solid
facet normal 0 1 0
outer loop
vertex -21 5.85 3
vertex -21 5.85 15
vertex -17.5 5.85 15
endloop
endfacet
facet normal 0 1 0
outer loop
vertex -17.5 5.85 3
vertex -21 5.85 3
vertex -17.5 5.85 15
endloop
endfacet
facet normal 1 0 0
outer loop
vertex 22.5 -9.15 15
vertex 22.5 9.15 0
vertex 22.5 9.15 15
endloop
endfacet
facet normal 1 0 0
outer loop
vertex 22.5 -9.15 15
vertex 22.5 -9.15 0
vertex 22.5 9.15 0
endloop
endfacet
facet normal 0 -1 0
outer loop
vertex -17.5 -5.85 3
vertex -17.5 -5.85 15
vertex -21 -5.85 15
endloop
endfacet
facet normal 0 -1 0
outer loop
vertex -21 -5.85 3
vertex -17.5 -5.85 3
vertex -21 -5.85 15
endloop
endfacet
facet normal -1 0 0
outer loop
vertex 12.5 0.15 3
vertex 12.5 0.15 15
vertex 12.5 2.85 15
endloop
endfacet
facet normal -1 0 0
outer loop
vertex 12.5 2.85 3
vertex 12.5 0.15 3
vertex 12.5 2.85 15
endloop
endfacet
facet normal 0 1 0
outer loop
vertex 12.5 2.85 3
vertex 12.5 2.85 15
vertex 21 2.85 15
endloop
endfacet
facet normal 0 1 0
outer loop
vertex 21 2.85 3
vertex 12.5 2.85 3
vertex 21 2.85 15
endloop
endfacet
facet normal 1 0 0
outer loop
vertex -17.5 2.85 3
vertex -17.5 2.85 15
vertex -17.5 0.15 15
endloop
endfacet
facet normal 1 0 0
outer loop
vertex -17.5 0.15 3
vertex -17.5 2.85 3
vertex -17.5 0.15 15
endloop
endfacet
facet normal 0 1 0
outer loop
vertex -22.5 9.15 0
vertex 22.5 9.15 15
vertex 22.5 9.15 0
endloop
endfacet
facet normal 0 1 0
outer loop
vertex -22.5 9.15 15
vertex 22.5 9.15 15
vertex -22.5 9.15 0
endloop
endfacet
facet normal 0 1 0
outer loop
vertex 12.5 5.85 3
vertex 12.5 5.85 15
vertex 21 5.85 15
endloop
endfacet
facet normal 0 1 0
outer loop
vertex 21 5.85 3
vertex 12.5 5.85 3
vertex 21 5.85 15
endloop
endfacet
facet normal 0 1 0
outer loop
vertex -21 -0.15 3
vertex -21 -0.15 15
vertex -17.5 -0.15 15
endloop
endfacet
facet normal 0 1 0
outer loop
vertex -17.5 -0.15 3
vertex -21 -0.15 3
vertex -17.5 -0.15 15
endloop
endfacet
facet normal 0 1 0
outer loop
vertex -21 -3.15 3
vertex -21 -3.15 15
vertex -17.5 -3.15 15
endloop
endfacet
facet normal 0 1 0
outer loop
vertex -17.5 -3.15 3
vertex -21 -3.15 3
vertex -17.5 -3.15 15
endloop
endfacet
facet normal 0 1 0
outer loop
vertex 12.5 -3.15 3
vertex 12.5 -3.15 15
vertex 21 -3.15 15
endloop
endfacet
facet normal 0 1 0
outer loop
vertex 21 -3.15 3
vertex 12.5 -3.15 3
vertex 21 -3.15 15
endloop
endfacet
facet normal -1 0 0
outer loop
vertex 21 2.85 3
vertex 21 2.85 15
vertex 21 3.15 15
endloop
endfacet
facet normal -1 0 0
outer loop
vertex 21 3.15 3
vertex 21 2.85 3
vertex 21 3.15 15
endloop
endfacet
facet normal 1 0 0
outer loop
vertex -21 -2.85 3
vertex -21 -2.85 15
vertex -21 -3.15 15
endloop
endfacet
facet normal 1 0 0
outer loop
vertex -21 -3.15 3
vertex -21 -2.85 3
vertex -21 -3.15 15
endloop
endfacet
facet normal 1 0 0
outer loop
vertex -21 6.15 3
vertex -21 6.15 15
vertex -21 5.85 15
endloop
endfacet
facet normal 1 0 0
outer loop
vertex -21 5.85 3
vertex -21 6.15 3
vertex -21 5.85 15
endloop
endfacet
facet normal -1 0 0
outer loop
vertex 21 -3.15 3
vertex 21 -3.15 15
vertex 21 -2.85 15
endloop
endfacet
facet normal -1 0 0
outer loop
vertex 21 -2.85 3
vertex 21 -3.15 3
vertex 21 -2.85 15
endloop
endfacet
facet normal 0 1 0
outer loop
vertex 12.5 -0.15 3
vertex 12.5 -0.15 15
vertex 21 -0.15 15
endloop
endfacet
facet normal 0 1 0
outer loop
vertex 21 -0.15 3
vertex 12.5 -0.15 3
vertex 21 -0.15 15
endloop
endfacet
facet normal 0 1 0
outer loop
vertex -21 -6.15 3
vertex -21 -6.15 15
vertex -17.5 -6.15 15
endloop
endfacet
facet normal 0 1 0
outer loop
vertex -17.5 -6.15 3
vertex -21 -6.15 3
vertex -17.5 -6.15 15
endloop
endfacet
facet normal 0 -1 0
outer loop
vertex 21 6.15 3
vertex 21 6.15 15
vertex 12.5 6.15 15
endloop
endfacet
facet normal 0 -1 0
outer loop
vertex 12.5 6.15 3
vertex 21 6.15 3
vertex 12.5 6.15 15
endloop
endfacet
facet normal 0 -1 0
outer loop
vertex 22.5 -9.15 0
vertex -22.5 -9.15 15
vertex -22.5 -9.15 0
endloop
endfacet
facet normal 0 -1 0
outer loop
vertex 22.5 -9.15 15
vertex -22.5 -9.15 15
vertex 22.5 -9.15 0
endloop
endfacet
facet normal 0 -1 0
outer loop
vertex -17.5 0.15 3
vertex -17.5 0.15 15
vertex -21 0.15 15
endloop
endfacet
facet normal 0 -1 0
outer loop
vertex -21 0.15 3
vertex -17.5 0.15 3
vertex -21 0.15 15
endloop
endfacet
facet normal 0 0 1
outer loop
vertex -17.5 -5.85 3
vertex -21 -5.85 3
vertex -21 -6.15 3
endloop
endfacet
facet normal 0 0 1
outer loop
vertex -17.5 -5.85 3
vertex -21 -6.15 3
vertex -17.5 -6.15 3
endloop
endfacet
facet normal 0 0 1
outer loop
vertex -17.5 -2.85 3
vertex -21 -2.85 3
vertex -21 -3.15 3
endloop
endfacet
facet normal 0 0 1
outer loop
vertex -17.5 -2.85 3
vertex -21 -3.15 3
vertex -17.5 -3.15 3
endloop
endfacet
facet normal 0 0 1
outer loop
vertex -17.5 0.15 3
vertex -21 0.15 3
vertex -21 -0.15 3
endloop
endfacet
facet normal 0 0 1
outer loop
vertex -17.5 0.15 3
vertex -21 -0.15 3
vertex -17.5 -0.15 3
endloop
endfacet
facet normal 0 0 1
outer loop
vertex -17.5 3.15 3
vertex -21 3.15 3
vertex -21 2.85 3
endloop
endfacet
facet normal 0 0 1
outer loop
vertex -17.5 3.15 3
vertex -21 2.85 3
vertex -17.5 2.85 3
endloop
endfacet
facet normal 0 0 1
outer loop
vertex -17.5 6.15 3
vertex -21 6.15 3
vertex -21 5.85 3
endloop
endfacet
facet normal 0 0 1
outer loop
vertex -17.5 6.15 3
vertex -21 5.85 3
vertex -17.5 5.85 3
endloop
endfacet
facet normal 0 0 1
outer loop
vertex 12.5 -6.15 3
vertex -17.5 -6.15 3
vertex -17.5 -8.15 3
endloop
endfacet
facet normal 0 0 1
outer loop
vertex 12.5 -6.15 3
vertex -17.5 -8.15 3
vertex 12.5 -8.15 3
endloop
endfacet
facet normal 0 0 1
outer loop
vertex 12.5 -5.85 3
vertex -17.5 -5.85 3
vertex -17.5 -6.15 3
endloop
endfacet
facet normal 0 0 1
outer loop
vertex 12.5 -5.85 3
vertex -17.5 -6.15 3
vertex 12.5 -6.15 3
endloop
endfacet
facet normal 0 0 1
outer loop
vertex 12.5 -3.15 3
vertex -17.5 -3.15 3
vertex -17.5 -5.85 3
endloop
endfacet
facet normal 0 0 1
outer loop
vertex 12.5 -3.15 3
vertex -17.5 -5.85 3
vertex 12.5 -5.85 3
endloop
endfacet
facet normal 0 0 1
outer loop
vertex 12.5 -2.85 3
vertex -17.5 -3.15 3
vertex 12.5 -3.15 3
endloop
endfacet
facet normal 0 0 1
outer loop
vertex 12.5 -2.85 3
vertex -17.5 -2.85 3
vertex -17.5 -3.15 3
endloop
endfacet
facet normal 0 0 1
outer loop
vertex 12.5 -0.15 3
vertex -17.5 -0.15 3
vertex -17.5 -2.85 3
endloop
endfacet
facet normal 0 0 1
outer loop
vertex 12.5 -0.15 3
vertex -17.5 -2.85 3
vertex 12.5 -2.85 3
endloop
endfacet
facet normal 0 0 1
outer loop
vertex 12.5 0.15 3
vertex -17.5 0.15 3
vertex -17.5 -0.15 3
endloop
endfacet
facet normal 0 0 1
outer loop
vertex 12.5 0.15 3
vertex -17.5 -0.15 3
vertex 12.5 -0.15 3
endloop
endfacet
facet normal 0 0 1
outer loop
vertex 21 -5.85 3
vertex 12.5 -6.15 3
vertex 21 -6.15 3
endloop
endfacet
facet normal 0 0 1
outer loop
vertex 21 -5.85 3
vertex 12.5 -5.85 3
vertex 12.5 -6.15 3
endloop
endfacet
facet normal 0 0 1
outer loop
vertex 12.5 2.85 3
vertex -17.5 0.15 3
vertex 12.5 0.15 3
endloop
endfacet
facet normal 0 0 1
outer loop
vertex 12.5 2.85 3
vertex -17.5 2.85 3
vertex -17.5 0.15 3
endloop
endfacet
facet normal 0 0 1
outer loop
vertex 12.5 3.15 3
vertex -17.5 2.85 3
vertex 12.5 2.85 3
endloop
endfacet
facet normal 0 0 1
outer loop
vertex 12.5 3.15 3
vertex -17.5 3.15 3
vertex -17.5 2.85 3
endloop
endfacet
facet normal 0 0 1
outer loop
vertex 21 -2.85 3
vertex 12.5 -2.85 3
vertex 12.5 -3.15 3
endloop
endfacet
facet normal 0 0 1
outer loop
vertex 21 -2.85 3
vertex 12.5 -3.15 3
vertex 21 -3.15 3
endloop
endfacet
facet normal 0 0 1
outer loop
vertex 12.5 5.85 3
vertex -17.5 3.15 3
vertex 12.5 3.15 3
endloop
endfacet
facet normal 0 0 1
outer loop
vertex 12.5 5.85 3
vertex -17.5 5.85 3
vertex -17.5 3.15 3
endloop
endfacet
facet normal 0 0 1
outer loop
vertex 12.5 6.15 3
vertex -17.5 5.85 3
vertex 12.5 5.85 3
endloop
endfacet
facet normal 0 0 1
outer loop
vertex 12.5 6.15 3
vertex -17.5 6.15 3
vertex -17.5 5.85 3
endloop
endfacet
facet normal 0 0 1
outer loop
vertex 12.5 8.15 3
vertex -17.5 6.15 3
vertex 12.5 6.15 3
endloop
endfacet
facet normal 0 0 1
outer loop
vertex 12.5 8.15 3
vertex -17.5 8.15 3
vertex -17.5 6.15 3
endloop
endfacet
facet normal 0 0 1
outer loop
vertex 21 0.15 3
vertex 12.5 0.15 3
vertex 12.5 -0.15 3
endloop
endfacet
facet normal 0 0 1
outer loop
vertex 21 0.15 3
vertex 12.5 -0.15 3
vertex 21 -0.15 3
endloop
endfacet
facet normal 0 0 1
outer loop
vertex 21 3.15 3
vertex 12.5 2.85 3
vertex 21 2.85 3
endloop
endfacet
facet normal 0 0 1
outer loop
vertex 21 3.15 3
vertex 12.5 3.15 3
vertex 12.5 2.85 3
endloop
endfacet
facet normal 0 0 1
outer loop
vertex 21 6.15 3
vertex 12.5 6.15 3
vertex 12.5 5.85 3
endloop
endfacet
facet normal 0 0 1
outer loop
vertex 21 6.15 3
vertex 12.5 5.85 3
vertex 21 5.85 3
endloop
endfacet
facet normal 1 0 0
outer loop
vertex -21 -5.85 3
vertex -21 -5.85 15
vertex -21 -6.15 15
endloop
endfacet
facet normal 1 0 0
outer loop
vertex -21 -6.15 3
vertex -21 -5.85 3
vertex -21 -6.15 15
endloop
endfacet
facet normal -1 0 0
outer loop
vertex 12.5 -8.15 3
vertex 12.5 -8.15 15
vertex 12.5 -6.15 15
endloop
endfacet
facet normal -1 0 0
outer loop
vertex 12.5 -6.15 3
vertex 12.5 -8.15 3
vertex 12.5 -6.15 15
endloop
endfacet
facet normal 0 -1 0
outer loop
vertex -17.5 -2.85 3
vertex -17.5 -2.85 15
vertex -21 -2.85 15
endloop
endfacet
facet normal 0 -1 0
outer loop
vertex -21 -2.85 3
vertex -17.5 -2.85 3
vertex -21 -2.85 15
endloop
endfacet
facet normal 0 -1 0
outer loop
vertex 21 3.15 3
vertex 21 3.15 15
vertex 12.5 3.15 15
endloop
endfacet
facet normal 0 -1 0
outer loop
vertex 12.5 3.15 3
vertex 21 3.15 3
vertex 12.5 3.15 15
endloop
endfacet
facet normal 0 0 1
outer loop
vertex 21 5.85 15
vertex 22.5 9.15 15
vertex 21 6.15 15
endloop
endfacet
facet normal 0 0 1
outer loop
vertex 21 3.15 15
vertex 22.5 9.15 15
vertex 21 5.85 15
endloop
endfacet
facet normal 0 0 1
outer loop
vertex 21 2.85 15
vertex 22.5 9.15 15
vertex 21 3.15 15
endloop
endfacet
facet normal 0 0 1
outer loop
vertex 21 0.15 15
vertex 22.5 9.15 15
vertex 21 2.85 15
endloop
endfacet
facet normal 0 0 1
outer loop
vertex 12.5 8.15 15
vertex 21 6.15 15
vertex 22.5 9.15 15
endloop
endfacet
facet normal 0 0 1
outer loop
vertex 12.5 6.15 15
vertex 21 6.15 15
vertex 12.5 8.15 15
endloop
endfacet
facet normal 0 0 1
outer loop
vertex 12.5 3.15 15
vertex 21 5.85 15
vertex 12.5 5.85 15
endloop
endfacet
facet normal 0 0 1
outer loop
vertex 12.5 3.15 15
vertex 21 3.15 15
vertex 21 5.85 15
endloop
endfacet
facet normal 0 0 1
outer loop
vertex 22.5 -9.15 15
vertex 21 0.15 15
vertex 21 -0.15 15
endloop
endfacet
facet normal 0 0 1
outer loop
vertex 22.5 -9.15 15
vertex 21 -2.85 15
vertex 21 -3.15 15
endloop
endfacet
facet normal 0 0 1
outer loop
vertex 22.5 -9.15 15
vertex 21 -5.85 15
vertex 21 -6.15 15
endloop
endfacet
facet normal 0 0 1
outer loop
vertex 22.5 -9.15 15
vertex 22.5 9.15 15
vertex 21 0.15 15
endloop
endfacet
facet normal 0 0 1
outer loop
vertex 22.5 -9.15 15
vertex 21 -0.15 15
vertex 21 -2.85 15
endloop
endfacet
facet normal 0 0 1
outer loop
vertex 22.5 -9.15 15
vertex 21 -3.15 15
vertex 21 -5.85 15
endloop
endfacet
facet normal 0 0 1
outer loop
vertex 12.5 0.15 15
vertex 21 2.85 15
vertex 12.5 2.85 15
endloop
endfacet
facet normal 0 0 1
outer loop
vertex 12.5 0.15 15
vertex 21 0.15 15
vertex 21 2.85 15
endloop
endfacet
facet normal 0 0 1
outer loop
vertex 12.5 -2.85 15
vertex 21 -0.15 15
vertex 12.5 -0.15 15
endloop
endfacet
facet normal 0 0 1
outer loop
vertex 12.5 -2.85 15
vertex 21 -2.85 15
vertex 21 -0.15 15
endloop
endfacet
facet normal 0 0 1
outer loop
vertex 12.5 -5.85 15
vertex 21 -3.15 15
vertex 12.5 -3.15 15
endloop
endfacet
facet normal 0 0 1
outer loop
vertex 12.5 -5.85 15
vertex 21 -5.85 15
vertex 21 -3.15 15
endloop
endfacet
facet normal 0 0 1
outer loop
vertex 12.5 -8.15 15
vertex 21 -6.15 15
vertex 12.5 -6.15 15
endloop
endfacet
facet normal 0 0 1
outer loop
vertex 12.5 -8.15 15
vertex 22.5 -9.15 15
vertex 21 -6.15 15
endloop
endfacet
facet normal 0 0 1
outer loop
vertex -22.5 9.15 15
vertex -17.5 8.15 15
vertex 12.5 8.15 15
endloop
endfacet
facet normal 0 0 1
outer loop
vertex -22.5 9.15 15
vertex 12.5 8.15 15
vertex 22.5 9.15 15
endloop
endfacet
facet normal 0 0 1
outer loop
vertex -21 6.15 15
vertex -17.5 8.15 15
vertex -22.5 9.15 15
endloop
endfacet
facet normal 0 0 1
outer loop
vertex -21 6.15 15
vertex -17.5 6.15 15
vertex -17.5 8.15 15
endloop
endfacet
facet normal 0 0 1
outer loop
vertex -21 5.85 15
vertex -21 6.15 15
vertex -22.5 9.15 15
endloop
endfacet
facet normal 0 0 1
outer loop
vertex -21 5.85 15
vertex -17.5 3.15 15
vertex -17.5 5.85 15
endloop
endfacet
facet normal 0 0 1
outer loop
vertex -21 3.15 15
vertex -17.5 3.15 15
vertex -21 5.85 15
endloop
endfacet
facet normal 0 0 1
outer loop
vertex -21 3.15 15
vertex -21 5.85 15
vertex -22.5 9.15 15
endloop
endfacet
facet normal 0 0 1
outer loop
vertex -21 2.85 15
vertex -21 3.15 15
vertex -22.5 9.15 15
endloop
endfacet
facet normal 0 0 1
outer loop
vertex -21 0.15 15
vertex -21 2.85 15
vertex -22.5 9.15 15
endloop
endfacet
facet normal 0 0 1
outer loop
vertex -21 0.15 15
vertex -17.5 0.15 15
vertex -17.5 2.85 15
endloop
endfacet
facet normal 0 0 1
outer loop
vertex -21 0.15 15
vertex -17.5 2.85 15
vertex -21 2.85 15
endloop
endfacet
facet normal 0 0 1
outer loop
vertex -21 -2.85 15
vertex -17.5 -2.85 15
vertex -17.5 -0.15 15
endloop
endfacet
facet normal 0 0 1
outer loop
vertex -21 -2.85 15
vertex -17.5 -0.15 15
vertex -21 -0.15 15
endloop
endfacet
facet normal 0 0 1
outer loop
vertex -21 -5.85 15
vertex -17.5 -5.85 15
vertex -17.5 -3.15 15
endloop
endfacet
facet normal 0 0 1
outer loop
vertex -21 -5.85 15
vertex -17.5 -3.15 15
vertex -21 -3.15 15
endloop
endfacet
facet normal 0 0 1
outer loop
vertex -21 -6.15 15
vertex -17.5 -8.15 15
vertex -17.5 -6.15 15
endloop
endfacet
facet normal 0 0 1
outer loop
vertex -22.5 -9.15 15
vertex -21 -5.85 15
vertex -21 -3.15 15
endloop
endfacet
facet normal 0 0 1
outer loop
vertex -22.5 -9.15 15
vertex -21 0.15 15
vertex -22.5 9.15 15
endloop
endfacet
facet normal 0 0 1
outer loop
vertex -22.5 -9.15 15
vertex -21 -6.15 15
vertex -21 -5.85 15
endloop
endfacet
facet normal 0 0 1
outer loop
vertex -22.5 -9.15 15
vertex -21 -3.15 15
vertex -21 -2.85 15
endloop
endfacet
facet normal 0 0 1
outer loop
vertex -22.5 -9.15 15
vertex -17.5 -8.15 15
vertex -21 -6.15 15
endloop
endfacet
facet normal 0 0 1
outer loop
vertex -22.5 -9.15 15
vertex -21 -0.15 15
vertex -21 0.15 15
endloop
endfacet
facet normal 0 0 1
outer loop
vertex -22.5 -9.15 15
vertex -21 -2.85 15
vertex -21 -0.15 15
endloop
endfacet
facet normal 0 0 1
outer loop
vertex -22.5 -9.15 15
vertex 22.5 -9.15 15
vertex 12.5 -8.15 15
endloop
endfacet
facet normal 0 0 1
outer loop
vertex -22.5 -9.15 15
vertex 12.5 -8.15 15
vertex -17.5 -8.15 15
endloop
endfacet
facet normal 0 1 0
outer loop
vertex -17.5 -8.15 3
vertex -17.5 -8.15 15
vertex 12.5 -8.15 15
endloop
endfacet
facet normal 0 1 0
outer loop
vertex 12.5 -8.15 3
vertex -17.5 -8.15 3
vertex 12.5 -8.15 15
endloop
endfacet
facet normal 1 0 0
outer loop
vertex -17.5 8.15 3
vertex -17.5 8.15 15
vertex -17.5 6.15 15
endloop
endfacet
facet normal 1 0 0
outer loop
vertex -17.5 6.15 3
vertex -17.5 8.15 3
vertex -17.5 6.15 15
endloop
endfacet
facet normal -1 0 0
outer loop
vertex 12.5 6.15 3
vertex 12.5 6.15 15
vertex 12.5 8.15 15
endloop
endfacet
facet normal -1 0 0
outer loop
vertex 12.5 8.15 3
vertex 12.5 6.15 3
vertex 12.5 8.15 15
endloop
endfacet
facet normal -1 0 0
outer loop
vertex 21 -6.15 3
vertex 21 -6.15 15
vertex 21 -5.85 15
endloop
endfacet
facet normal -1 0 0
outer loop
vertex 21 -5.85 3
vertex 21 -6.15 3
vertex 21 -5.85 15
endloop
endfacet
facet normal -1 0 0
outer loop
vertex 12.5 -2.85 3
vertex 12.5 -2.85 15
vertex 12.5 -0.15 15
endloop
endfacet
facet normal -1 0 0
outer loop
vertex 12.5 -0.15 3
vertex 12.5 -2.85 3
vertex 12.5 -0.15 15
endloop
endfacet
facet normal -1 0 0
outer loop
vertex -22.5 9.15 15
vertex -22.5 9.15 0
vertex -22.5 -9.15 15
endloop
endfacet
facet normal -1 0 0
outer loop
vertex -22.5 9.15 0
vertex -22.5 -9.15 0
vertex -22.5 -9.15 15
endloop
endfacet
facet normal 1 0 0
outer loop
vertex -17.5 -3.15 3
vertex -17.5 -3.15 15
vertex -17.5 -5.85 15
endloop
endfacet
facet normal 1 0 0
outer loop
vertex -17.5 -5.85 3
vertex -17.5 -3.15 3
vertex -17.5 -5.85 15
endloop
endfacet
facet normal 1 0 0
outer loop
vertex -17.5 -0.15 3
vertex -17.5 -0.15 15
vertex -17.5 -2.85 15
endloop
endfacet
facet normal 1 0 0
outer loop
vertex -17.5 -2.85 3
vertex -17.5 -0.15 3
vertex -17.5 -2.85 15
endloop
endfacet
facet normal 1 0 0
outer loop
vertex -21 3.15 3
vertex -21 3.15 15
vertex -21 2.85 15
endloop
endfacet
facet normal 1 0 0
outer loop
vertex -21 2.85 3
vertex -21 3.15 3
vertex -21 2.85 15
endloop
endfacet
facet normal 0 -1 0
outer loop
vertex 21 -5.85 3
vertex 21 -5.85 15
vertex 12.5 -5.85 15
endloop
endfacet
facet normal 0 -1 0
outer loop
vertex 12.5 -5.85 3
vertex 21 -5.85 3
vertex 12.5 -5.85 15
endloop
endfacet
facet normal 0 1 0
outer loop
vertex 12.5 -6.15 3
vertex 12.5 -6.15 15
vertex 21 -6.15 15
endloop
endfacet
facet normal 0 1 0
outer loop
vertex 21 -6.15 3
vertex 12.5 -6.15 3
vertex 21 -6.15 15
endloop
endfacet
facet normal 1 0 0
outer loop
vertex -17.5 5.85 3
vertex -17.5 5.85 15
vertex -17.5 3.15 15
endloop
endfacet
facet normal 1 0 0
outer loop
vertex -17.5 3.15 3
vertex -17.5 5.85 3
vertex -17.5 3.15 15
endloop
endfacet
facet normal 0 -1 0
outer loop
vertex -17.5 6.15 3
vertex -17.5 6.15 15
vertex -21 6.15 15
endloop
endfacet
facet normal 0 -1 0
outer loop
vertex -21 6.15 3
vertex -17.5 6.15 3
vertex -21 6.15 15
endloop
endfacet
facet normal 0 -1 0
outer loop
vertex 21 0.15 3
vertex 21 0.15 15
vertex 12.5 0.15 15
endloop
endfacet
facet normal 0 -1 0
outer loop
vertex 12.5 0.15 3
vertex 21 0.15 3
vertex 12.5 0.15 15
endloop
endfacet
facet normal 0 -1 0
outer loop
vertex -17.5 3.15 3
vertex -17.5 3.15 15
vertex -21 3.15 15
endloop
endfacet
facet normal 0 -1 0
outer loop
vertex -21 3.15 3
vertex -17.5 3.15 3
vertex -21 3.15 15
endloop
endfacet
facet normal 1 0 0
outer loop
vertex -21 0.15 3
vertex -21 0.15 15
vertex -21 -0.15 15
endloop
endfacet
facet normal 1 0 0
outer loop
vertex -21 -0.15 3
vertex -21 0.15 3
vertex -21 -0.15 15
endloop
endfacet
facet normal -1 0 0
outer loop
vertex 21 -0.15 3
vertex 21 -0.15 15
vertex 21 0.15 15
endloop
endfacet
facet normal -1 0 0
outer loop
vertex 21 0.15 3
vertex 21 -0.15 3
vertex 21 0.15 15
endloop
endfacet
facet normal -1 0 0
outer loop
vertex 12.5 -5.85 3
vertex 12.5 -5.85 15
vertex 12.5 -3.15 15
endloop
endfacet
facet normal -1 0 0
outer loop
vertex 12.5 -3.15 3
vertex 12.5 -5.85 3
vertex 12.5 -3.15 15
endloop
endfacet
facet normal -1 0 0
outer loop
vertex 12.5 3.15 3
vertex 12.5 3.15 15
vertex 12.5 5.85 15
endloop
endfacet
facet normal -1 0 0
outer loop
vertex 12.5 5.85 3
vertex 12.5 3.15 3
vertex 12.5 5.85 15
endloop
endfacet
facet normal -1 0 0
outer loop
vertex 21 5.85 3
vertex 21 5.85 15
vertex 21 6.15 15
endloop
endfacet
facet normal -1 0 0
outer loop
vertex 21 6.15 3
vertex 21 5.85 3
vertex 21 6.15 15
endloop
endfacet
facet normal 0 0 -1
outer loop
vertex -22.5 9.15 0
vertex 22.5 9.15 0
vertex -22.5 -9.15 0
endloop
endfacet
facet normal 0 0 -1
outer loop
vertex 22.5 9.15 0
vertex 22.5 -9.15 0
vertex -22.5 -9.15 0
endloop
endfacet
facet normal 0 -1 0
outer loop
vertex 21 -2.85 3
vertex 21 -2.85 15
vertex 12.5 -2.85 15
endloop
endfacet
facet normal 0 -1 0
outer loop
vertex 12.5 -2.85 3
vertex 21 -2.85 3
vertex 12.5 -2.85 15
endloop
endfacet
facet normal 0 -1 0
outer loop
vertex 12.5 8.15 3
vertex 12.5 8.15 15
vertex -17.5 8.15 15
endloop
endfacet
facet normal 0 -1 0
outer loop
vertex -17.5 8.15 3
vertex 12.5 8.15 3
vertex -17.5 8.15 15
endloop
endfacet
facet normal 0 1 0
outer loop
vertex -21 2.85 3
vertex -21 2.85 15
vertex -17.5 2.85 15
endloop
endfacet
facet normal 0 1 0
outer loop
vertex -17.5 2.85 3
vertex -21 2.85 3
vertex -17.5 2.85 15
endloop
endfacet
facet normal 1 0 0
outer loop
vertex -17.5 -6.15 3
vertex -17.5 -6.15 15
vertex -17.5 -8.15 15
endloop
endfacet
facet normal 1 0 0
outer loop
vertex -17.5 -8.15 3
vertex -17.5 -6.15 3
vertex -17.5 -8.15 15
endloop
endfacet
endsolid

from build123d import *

# Parameters (mm, degrees)
F0_W     = 45
F0_H     = 16.3
F1_DEPTH = 15
F3_DEPTH = 12
F4_W     = 45
F4_H     = 15
F5_DEPTH = 1
F6_W     = 45
F6_H     = 15
F7_DEPTH = 1


with BuildPart() as f1:
    # F0 (on Top) → F1 (new body)
    with BuildSketch(Plane.XY):
        Rectangle(F0_W, F0_H)
    extrude(amount=F1_DEPTH)

    # F2 (on face) → F3 (cut)
    with BuildSketch(Plane.XY.offset(15)):
        Polygon((-21, -5.85), (-21, -6.15), (-17.5, -6.15), (-17.5, -8.15), (12.5, -8.15), (12.5, -6.15), (21, -6.15), (21, -5.85), (12.5, -5.85), (12.5, -3.15), (21, -3.15), (21, -2.85), (12.5, -2.85), (12.5, -0.15), (21, -0.15), (21, 0.15), (12.5, 0.15), (12.5, 2.85), (21, 2.85), (21, 3.15), (12.5, 3.15), (12.5, 5.85), (21, 5.85), (21, 6.15), (12.5, 6.15), (12.5, 8.15), (-17.5, 8.15), (-17.5, 6.15), (-21, 6.15), (-21, 5.85), (-17.5, 5.85), (-17.5, 3.15), (-21, 3.15), (-21, 2.85), (-17.5, 2.85), (-17.5, 0.15), (-21, 0.15), (-21, -0.15), (-17.5, -0.15), (-17.5, -2.85), (-21, -2.85), (-21, -3.15), (-17.5, -3.15), (-17.5, -5.85), align=None)
    extrude(amount=-F3_DEPTH, mode=Mode.SUBTRACT)

    # F4 (on face) → F5 (join)
    with BuildSketch(Plane.XZ.offset(8.15)):
        with Locations((0, 7.5)):
            Rectangle(F4_W, F4_H)
    extrude(amount=F5_DEPTH)

    # F6 (on face) → F7 (join)
    with BuildSketch(Plane(origin=(0, 8.15, 0), x_dir=(-1, 0, 0), z_dir=(0, 1, 0))):
        with Locations((0, 7.5)):
            Rectangle(F6_W, F6_H)
    extrude(amount=F7_DEPTH)


solid = f1.part
